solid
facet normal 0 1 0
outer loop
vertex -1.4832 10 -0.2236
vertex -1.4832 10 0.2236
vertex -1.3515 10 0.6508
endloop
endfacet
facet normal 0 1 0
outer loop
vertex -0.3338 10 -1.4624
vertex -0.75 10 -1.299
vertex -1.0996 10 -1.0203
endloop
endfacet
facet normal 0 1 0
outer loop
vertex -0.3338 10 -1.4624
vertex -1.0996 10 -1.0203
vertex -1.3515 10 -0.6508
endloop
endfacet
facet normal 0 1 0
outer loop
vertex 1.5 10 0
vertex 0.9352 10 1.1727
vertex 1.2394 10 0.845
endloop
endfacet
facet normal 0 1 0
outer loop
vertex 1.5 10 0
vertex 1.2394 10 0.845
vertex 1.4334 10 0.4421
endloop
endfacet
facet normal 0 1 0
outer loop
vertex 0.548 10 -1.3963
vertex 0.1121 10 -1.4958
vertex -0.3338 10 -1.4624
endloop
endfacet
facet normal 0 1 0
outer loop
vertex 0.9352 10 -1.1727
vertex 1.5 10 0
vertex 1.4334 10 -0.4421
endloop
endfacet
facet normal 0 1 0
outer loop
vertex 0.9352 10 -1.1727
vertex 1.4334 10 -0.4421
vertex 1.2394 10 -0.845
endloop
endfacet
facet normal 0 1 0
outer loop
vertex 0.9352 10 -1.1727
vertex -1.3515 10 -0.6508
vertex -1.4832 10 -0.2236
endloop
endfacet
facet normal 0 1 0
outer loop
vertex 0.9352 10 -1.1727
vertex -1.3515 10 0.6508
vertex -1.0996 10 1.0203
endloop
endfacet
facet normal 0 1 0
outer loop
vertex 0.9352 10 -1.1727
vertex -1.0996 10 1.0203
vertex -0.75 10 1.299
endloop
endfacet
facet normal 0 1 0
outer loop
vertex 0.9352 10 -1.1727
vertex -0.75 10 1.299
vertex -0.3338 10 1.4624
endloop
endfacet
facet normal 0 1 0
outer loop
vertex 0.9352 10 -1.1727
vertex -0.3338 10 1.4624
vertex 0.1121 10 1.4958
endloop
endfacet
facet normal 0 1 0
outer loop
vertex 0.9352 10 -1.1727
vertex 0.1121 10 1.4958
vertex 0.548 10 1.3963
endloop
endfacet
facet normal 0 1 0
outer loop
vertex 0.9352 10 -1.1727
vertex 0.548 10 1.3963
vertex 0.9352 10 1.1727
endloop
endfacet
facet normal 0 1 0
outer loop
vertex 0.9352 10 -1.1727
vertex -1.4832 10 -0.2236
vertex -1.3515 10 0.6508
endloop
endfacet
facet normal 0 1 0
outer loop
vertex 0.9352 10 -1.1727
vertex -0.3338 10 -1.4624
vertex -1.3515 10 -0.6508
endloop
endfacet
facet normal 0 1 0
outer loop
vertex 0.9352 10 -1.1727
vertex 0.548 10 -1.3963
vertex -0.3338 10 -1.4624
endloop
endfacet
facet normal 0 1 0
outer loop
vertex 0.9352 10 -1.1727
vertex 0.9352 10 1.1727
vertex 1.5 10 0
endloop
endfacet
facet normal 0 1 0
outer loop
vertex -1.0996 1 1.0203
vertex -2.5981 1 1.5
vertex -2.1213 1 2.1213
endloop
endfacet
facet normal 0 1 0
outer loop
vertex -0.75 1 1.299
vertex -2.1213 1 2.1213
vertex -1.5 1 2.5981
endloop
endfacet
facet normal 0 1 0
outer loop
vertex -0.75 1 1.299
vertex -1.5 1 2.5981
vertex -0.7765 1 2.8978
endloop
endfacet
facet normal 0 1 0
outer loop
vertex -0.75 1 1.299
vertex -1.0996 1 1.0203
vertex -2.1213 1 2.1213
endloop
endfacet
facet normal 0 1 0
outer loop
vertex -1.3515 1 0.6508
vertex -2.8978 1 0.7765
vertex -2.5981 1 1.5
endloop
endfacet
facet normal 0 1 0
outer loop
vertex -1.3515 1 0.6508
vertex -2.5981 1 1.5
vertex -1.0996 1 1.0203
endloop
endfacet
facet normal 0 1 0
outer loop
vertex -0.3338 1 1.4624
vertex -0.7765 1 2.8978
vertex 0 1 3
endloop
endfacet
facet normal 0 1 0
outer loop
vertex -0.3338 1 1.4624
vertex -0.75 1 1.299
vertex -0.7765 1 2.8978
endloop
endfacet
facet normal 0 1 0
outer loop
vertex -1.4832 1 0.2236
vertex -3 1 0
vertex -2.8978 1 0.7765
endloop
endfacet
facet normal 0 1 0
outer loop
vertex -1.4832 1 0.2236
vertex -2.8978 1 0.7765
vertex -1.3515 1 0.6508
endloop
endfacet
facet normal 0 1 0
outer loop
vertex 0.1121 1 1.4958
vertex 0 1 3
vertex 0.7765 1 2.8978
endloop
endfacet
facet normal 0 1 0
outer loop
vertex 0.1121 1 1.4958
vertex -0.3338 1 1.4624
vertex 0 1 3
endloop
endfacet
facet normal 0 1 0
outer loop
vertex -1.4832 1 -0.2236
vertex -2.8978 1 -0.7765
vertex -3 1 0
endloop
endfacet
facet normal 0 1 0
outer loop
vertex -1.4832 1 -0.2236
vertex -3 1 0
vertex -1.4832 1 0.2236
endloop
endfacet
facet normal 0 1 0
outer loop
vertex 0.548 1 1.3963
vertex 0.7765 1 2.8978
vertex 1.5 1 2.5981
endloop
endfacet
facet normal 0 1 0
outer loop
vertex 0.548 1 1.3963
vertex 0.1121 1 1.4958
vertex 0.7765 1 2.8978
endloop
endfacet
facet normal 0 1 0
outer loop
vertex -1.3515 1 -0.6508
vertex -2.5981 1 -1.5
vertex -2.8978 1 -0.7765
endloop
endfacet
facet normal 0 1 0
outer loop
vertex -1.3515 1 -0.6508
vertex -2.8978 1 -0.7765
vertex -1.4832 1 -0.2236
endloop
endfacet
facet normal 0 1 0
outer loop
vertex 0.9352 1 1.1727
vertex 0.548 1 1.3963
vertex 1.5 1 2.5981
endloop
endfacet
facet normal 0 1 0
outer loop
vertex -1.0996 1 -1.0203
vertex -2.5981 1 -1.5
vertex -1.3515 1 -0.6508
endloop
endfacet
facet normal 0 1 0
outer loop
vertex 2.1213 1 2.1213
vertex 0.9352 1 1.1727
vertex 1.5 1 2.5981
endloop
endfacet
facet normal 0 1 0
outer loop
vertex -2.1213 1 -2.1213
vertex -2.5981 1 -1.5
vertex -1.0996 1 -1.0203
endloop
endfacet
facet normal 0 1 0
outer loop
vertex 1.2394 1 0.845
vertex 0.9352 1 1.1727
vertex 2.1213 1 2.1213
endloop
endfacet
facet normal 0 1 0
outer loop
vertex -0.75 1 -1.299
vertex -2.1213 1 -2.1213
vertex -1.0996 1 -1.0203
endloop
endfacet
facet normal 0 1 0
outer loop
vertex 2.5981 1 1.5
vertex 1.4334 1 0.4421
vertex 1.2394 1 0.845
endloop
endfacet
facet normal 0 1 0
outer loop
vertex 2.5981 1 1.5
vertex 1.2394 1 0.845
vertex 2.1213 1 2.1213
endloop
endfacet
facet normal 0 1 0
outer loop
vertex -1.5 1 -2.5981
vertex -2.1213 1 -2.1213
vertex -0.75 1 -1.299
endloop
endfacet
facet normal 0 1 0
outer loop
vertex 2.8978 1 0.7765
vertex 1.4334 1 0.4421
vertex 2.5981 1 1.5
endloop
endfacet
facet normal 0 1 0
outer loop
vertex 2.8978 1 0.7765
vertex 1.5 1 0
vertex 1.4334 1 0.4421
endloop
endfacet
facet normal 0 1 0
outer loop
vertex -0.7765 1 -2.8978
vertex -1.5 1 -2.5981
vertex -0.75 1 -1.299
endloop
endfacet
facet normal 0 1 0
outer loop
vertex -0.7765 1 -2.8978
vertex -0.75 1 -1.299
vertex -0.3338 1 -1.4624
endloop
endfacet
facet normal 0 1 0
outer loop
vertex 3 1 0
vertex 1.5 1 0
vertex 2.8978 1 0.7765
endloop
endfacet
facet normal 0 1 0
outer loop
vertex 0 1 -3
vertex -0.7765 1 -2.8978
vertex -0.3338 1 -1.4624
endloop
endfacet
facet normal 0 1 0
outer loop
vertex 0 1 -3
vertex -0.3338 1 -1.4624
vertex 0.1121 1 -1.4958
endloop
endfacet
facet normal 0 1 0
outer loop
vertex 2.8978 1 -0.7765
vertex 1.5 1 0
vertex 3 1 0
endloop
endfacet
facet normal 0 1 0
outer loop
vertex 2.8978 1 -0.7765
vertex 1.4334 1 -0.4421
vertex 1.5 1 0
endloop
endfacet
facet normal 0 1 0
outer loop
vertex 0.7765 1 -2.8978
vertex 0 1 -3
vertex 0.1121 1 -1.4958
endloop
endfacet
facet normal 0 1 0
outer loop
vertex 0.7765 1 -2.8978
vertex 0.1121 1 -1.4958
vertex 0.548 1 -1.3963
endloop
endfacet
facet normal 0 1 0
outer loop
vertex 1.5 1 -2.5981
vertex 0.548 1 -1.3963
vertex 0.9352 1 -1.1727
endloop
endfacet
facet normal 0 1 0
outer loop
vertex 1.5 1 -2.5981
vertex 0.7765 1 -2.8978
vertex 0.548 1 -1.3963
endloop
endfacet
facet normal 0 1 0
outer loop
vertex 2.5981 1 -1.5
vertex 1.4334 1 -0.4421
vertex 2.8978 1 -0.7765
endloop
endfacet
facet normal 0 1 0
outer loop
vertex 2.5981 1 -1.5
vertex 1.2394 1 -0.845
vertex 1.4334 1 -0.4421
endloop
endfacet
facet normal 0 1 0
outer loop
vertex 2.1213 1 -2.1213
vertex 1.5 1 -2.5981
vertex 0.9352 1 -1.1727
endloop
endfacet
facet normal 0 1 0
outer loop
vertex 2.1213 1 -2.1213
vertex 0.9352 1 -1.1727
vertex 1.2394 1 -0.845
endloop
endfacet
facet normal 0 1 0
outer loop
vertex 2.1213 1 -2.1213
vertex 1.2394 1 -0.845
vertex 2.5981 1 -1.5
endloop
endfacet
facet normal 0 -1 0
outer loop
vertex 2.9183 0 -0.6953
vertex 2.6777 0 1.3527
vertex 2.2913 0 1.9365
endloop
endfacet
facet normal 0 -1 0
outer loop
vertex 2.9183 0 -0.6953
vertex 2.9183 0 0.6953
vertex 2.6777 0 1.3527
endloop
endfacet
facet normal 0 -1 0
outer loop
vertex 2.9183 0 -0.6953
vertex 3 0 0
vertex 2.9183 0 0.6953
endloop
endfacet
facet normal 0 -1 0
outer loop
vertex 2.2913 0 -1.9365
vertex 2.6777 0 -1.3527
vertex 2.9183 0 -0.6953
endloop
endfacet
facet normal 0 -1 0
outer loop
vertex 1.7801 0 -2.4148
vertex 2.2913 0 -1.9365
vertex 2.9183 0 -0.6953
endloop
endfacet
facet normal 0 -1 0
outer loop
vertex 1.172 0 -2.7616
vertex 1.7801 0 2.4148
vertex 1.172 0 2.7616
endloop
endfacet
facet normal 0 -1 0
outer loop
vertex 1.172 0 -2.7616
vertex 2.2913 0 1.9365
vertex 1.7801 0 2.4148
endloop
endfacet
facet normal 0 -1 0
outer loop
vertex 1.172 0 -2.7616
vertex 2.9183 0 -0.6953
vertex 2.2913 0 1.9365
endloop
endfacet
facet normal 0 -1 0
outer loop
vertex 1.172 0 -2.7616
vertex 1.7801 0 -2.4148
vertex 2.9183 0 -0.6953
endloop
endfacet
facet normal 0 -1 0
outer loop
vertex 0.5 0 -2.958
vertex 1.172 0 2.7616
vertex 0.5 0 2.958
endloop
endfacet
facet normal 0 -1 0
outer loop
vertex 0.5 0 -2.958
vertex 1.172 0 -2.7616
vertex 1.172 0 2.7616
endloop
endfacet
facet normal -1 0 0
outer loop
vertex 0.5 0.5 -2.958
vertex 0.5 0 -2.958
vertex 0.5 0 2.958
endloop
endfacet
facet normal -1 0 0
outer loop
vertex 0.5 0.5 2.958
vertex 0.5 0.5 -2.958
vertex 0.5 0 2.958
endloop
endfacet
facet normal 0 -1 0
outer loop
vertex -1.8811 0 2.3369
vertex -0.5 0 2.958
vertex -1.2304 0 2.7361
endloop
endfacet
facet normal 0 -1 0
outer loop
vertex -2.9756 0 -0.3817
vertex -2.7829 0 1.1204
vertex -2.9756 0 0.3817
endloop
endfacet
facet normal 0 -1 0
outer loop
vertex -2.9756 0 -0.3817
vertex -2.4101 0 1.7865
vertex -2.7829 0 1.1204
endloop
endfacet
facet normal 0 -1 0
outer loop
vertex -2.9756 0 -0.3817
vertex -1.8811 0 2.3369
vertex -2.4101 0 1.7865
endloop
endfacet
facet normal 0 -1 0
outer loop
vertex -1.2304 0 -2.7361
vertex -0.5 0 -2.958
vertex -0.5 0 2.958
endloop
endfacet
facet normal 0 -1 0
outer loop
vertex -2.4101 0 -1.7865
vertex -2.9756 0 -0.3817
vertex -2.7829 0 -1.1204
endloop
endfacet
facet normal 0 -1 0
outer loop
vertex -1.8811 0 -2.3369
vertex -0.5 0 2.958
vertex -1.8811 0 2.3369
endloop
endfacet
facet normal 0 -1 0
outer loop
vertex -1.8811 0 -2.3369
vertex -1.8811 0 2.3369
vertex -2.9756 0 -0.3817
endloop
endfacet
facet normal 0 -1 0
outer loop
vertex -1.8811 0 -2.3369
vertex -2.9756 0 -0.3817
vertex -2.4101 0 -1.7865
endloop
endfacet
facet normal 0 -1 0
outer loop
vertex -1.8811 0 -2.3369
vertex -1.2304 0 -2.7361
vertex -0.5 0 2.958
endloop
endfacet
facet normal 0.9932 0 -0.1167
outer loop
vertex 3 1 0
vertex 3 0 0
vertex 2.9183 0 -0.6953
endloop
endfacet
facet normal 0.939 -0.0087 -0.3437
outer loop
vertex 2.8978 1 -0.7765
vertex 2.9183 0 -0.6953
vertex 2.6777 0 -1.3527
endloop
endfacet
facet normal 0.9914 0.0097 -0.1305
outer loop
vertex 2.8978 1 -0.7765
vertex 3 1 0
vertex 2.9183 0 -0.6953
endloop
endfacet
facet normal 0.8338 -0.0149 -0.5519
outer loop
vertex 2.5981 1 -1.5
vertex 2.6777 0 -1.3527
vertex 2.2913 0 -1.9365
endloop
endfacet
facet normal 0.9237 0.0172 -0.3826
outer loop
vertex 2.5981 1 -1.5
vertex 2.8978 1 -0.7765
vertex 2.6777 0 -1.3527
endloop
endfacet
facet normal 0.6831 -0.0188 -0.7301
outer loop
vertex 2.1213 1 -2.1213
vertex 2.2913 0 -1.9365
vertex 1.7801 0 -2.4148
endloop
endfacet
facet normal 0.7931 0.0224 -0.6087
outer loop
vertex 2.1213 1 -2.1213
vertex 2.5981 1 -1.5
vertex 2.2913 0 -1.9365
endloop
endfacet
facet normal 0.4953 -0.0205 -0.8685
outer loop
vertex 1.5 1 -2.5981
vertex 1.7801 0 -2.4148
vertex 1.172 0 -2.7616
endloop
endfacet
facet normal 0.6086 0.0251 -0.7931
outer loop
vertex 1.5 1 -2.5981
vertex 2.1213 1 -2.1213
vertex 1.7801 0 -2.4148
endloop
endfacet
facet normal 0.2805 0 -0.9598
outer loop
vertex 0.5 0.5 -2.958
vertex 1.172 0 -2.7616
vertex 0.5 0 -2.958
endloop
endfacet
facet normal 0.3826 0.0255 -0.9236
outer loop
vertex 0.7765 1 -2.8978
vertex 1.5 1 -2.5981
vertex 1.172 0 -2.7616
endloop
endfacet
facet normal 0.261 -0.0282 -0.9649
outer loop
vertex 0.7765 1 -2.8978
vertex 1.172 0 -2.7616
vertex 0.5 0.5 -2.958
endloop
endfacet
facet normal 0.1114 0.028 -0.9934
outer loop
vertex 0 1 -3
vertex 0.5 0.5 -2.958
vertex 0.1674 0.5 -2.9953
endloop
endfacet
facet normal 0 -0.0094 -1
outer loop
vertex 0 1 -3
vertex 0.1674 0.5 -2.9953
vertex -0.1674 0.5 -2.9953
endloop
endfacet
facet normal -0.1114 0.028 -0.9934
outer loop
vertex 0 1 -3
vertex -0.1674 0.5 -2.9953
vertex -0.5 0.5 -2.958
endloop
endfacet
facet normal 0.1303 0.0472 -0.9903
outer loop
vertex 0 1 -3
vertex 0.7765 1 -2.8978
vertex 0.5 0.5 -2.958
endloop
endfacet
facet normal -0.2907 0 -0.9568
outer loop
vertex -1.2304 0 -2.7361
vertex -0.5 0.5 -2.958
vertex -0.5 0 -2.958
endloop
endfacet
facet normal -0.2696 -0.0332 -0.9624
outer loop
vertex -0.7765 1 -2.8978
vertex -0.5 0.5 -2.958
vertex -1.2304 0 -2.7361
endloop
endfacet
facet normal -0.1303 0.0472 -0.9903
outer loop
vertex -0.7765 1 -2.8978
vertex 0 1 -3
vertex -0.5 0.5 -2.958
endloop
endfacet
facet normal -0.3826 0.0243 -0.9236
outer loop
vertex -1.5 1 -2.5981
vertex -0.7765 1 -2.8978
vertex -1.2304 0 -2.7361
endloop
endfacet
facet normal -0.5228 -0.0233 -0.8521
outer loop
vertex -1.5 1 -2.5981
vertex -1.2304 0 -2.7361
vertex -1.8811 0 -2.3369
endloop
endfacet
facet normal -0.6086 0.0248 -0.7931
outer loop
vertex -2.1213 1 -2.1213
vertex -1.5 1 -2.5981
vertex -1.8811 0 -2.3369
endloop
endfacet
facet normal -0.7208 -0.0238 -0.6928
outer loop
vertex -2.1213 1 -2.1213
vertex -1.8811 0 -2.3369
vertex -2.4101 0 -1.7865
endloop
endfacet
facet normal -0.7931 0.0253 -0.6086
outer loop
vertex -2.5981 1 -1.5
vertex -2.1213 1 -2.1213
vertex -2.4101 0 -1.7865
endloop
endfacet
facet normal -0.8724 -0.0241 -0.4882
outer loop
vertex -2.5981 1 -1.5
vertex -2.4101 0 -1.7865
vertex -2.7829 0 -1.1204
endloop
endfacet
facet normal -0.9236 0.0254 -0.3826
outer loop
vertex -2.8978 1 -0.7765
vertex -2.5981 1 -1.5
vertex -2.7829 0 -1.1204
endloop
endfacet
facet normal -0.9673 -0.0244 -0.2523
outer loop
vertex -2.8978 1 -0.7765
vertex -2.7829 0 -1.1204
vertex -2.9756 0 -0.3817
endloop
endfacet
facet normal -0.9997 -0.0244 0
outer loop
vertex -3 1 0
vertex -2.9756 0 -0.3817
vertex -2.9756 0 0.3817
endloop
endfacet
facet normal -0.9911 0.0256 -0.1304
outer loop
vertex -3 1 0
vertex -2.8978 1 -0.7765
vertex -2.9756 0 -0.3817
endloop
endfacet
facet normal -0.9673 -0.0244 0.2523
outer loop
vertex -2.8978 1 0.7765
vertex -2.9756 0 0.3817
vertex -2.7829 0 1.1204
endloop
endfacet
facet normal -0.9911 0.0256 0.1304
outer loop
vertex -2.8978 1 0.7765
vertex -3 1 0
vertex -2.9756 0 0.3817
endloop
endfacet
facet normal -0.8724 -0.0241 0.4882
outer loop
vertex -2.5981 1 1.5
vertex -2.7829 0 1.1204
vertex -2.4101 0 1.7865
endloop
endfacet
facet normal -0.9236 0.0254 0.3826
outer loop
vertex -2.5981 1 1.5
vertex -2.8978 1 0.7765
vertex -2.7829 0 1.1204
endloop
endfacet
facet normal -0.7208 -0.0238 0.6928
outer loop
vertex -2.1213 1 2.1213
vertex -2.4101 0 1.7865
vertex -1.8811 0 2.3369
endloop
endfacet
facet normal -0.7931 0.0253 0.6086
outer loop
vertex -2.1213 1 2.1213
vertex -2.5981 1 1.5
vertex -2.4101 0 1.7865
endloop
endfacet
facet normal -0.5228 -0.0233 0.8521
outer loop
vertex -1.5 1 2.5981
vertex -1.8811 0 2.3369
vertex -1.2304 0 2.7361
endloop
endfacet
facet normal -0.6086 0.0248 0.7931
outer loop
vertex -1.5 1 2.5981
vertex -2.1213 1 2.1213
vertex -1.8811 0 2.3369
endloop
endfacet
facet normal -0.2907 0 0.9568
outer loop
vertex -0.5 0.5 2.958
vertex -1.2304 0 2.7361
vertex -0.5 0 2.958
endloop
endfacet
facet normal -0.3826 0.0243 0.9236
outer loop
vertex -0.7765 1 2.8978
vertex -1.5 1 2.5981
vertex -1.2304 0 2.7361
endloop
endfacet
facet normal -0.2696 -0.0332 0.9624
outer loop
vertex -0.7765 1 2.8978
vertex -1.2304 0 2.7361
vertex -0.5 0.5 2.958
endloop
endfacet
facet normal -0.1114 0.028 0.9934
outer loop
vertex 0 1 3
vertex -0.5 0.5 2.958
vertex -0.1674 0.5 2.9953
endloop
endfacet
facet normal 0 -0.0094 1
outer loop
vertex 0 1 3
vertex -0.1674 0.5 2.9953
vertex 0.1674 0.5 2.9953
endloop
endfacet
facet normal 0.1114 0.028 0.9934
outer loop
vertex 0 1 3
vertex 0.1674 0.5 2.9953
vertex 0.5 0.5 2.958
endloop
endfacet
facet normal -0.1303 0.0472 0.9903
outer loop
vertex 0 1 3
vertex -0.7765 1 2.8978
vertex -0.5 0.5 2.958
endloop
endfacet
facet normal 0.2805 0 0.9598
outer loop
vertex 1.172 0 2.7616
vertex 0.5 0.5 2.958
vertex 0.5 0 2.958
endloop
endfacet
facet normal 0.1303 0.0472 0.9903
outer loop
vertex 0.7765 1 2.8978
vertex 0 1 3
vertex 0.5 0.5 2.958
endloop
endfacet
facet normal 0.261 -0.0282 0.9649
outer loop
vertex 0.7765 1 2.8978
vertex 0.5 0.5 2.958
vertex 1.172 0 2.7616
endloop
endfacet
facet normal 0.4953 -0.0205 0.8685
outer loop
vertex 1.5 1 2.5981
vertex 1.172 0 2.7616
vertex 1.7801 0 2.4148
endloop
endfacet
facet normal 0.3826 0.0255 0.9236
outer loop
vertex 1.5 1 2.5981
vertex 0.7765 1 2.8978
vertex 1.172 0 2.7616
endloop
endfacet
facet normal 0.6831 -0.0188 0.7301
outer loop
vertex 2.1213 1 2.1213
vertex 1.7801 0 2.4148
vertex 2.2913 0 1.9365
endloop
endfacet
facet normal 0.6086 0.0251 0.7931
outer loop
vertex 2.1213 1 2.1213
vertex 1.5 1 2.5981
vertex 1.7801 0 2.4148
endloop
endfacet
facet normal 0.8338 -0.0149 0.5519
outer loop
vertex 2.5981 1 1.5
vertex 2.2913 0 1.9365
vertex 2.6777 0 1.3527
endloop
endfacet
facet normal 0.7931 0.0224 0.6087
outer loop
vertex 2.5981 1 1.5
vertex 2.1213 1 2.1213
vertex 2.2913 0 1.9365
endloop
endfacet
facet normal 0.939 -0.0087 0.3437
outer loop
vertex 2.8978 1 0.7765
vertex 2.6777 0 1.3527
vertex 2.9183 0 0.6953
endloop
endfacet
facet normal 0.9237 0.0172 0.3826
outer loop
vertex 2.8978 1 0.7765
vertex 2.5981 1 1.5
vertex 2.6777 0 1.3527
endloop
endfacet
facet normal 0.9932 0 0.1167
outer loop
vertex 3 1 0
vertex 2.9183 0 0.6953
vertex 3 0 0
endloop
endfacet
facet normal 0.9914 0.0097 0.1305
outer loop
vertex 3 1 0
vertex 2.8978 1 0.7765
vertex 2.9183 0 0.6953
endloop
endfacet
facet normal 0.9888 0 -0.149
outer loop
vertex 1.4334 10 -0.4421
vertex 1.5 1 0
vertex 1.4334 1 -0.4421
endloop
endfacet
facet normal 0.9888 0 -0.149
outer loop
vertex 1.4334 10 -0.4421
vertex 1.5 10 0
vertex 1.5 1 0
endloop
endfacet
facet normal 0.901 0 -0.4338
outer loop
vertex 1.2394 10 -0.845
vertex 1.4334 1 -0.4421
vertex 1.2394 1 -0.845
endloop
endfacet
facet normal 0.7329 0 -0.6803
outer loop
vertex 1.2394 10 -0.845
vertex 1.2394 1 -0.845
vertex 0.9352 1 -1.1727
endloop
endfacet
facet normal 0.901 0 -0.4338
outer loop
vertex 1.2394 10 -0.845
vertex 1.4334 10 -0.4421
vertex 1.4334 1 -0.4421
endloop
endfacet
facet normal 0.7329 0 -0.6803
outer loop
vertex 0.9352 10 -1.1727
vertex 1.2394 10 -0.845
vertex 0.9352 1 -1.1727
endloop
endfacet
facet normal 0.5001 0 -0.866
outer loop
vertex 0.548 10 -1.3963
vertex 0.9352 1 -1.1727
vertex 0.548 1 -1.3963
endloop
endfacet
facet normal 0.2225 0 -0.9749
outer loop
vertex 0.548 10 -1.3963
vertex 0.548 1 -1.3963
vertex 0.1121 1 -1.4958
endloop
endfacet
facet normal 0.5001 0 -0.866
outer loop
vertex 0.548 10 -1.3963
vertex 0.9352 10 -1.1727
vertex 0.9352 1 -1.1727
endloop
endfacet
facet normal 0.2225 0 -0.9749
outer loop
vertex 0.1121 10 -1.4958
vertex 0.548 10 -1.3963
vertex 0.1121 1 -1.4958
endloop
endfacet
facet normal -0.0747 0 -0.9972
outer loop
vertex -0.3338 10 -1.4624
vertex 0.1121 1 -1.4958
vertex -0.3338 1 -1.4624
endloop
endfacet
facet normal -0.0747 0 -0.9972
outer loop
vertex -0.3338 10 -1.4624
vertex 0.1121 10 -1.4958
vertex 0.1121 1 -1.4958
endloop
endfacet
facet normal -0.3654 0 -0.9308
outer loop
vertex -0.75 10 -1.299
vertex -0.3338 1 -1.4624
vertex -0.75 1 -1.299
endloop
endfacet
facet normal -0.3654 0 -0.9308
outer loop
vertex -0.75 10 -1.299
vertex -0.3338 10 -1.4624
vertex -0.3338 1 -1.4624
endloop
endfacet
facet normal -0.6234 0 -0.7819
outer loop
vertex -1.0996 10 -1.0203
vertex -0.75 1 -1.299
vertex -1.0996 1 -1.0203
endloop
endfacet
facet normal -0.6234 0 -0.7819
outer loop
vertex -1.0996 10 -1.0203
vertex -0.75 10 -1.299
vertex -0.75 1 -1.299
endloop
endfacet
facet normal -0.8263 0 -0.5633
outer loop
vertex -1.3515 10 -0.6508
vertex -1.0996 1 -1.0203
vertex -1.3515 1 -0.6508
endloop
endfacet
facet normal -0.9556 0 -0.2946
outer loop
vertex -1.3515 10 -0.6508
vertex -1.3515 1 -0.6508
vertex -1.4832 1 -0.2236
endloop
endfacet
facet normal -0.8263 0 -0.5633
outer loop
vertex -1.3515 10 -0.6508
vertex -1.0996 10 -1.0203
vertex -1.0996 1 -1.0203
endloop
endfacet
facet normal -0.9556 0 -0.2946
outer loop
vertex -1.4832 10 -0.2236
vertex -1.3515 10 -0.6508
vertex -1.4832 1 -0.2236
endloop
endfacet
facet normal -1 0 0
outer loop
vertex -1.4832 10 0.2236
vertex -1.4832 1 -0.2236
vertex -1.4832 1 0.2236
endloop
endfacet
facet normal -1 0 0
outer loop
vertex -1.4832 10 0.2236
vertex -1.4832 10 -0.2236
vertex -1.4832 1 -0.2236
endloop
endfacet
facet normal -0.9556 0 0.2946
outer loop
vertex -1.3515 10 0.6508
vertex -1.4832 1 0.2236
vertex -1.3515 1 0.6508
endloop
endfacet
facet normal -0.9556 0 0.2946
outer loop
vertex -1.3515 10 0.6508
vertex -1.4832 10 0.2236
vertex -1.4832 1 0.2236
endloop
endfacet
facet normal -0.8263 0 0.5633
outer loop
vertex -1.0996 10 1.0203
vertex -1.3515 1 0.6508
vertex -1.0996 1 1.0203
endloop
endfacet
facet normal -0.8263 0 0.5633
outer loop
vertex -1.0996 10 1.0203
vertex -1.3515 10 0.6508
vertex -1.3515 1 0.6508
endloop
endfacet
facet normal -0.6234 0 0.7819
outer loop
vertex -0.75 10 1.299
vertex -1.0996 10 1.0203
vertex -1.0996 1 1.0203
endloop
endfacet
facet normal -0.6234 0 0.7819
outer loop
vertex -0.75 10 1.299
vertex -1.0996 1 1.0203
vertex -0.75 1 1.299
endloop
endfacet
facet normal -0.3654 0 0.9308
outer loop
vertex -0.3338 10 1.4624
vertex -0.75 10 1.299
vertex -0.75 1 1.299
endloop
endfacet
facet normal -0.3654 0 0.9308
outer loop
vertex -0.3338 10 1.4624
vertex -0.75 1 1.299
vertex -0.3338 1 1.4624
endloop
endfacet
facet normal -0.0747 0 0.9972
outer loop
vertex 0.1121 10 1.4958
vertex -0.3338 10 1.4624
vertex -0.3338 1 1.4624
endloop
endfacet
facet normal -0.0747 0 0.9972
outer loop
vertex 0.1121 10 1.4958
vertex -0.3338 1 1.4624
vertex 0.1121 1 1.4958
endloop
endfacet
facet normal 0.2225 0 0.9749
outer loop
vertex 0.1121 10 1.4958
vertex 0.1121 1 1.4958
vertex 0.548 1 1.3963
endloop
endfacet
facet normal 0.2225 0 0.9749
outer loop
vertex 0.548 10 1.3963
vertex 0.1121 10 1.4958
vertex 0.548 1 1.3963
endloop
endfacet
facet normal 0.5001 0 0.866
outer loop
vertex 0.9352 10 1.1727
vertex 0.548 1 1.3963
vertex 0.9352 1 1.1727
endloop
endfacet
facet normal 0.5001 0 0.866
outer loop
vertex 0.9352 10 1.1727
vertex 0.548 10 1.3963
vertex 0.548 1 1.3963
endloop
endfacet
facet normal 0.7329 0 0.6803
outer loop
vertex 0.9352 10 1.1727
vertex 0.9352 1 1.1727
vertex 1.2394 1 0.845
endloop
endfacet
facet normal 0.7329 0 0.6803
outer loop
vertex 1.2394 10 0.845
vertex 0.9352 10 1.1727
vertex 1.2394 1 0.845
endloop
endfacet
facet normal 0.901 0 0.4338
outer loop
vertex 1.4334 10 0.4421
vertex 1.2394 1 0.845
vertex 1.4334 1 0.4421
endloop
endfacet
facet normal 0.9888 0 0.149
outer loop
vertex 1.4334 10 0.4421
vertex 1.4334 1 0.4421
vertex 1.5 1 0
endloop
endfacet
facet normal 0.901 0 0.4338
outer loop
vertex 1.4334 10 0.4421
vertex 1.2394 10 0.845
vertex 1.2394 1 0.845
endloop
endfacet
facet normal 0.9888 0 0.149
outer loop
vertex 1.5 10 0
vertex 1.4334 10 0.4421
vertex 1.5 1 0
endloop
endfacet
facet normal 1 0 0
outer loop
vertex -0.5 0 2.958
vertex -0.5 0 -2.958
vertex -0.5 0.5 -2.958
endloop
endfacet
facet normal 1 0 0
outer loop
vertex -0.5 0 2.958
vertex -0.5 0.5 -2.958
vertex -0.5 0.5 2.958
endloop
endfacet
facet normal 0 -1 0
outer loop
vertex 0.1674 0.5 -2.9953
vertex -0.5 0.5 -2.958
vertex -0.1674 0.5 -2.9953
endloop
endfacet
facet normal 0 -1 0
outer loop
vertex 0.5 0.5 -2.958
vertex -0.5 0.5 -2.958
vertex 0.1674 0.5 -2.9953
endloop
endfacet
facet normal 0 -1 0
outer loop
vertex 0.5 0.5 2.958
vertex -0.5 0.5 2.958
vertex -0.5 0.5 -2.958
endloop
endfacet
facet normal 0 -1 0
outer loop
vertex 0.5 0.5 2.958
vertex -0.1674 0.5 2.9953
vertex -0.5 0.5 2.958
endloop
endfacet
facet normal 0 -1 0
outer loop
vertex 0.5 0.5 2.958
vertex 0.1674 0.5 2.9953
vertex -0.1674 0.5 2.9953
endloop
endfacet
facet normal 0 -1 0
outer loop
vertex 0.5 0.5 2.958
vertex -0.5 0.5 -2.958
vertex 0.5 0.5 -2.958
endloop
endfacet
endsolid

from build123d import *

# Parameters (mm, degrees)
ESQUISSE2_W             = 1
ESQUISSE2_H             = 6
ENL_V_MAT_EXTRU_1_DEPTH = 0.5


with BuildPart() as part:
    # Esquisse1 → Révolution1 (revolve)
    with BuildSketch(Plane.XY):
        Polygon((0, 0), (3, 0), (3, 1), (1.5, 1), (1.5, 10), (0, 10), align=None)
    revolve(axis=Axis((0, 0, 0), (0, 1, 0)))

    # Esquisse2 → Enlèv. mat.-Extru.1 (cut)
    with BuildSketch(Plane.XZ):
        Rectangle(ESQUISSE2_W, ESQUISSE2_H)
    extrude(amount=-ENL_V_MAT_EXTRU_1_DEPTH, mode=Mode.SUBTRACT)


solid = part.part
